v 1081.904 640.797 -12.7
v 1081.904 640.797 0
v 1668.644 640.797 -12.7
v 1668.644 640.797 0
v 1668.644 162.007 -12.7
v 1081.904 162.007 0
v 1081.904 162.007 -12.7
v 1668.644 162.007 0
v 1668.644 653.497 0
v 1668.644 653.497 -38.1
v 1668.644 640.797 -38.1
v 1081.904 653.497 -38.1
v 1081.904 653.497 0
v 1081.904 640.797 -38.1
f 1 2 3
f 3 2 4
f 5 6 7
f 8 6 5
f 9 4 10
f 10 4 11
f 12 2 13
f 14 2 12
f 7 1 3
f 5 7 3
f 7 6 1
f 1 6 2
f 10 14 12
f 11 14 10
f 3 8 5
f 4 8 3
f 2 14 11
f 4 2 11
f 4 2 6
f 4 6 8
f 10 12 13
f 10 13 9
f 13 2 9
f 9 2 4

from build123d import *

# Parameters (mm, degrees)
SKETCH1_W           = 586.74
SKETCH1_H           = 478.79
BOSS_EXTRUDE1_DEPTH = 12.7
SKETCH2_W           = 586.74
SKETCH2_H           = 38.1
BOSS_EXTRUDE2_DEPTH = 12.7


with BuildPart() as part:
    # Sketch1 → Boss-Extrude1 (new body)
    with BuildSketch(Plane.XY):
        with Locations((1375.27385267, 401.401856284)):
            Rectangle(SKETCH1_W, SKETCH1_H)
    extrude(amount=-BOSS_EXTRUDE1_DEPTH)


with BuildPart() as body_2:
    # Sketch2 → Boss-Extrude2 (new body)
    with BuildSketch(Plane(origin=(0, 640.796856284, 0), x_dir=(1, 0, 0), z_dir=(0, 1, 0))):
        with Locations((1375.27385267, 19.05)):
            Rectangle(SKETCH2_W, SKETCH2_H)
    extrude(amount=BOSS_EXTRUDE2_DEPTH)


solid = Compound([part.part, body_2.part])
